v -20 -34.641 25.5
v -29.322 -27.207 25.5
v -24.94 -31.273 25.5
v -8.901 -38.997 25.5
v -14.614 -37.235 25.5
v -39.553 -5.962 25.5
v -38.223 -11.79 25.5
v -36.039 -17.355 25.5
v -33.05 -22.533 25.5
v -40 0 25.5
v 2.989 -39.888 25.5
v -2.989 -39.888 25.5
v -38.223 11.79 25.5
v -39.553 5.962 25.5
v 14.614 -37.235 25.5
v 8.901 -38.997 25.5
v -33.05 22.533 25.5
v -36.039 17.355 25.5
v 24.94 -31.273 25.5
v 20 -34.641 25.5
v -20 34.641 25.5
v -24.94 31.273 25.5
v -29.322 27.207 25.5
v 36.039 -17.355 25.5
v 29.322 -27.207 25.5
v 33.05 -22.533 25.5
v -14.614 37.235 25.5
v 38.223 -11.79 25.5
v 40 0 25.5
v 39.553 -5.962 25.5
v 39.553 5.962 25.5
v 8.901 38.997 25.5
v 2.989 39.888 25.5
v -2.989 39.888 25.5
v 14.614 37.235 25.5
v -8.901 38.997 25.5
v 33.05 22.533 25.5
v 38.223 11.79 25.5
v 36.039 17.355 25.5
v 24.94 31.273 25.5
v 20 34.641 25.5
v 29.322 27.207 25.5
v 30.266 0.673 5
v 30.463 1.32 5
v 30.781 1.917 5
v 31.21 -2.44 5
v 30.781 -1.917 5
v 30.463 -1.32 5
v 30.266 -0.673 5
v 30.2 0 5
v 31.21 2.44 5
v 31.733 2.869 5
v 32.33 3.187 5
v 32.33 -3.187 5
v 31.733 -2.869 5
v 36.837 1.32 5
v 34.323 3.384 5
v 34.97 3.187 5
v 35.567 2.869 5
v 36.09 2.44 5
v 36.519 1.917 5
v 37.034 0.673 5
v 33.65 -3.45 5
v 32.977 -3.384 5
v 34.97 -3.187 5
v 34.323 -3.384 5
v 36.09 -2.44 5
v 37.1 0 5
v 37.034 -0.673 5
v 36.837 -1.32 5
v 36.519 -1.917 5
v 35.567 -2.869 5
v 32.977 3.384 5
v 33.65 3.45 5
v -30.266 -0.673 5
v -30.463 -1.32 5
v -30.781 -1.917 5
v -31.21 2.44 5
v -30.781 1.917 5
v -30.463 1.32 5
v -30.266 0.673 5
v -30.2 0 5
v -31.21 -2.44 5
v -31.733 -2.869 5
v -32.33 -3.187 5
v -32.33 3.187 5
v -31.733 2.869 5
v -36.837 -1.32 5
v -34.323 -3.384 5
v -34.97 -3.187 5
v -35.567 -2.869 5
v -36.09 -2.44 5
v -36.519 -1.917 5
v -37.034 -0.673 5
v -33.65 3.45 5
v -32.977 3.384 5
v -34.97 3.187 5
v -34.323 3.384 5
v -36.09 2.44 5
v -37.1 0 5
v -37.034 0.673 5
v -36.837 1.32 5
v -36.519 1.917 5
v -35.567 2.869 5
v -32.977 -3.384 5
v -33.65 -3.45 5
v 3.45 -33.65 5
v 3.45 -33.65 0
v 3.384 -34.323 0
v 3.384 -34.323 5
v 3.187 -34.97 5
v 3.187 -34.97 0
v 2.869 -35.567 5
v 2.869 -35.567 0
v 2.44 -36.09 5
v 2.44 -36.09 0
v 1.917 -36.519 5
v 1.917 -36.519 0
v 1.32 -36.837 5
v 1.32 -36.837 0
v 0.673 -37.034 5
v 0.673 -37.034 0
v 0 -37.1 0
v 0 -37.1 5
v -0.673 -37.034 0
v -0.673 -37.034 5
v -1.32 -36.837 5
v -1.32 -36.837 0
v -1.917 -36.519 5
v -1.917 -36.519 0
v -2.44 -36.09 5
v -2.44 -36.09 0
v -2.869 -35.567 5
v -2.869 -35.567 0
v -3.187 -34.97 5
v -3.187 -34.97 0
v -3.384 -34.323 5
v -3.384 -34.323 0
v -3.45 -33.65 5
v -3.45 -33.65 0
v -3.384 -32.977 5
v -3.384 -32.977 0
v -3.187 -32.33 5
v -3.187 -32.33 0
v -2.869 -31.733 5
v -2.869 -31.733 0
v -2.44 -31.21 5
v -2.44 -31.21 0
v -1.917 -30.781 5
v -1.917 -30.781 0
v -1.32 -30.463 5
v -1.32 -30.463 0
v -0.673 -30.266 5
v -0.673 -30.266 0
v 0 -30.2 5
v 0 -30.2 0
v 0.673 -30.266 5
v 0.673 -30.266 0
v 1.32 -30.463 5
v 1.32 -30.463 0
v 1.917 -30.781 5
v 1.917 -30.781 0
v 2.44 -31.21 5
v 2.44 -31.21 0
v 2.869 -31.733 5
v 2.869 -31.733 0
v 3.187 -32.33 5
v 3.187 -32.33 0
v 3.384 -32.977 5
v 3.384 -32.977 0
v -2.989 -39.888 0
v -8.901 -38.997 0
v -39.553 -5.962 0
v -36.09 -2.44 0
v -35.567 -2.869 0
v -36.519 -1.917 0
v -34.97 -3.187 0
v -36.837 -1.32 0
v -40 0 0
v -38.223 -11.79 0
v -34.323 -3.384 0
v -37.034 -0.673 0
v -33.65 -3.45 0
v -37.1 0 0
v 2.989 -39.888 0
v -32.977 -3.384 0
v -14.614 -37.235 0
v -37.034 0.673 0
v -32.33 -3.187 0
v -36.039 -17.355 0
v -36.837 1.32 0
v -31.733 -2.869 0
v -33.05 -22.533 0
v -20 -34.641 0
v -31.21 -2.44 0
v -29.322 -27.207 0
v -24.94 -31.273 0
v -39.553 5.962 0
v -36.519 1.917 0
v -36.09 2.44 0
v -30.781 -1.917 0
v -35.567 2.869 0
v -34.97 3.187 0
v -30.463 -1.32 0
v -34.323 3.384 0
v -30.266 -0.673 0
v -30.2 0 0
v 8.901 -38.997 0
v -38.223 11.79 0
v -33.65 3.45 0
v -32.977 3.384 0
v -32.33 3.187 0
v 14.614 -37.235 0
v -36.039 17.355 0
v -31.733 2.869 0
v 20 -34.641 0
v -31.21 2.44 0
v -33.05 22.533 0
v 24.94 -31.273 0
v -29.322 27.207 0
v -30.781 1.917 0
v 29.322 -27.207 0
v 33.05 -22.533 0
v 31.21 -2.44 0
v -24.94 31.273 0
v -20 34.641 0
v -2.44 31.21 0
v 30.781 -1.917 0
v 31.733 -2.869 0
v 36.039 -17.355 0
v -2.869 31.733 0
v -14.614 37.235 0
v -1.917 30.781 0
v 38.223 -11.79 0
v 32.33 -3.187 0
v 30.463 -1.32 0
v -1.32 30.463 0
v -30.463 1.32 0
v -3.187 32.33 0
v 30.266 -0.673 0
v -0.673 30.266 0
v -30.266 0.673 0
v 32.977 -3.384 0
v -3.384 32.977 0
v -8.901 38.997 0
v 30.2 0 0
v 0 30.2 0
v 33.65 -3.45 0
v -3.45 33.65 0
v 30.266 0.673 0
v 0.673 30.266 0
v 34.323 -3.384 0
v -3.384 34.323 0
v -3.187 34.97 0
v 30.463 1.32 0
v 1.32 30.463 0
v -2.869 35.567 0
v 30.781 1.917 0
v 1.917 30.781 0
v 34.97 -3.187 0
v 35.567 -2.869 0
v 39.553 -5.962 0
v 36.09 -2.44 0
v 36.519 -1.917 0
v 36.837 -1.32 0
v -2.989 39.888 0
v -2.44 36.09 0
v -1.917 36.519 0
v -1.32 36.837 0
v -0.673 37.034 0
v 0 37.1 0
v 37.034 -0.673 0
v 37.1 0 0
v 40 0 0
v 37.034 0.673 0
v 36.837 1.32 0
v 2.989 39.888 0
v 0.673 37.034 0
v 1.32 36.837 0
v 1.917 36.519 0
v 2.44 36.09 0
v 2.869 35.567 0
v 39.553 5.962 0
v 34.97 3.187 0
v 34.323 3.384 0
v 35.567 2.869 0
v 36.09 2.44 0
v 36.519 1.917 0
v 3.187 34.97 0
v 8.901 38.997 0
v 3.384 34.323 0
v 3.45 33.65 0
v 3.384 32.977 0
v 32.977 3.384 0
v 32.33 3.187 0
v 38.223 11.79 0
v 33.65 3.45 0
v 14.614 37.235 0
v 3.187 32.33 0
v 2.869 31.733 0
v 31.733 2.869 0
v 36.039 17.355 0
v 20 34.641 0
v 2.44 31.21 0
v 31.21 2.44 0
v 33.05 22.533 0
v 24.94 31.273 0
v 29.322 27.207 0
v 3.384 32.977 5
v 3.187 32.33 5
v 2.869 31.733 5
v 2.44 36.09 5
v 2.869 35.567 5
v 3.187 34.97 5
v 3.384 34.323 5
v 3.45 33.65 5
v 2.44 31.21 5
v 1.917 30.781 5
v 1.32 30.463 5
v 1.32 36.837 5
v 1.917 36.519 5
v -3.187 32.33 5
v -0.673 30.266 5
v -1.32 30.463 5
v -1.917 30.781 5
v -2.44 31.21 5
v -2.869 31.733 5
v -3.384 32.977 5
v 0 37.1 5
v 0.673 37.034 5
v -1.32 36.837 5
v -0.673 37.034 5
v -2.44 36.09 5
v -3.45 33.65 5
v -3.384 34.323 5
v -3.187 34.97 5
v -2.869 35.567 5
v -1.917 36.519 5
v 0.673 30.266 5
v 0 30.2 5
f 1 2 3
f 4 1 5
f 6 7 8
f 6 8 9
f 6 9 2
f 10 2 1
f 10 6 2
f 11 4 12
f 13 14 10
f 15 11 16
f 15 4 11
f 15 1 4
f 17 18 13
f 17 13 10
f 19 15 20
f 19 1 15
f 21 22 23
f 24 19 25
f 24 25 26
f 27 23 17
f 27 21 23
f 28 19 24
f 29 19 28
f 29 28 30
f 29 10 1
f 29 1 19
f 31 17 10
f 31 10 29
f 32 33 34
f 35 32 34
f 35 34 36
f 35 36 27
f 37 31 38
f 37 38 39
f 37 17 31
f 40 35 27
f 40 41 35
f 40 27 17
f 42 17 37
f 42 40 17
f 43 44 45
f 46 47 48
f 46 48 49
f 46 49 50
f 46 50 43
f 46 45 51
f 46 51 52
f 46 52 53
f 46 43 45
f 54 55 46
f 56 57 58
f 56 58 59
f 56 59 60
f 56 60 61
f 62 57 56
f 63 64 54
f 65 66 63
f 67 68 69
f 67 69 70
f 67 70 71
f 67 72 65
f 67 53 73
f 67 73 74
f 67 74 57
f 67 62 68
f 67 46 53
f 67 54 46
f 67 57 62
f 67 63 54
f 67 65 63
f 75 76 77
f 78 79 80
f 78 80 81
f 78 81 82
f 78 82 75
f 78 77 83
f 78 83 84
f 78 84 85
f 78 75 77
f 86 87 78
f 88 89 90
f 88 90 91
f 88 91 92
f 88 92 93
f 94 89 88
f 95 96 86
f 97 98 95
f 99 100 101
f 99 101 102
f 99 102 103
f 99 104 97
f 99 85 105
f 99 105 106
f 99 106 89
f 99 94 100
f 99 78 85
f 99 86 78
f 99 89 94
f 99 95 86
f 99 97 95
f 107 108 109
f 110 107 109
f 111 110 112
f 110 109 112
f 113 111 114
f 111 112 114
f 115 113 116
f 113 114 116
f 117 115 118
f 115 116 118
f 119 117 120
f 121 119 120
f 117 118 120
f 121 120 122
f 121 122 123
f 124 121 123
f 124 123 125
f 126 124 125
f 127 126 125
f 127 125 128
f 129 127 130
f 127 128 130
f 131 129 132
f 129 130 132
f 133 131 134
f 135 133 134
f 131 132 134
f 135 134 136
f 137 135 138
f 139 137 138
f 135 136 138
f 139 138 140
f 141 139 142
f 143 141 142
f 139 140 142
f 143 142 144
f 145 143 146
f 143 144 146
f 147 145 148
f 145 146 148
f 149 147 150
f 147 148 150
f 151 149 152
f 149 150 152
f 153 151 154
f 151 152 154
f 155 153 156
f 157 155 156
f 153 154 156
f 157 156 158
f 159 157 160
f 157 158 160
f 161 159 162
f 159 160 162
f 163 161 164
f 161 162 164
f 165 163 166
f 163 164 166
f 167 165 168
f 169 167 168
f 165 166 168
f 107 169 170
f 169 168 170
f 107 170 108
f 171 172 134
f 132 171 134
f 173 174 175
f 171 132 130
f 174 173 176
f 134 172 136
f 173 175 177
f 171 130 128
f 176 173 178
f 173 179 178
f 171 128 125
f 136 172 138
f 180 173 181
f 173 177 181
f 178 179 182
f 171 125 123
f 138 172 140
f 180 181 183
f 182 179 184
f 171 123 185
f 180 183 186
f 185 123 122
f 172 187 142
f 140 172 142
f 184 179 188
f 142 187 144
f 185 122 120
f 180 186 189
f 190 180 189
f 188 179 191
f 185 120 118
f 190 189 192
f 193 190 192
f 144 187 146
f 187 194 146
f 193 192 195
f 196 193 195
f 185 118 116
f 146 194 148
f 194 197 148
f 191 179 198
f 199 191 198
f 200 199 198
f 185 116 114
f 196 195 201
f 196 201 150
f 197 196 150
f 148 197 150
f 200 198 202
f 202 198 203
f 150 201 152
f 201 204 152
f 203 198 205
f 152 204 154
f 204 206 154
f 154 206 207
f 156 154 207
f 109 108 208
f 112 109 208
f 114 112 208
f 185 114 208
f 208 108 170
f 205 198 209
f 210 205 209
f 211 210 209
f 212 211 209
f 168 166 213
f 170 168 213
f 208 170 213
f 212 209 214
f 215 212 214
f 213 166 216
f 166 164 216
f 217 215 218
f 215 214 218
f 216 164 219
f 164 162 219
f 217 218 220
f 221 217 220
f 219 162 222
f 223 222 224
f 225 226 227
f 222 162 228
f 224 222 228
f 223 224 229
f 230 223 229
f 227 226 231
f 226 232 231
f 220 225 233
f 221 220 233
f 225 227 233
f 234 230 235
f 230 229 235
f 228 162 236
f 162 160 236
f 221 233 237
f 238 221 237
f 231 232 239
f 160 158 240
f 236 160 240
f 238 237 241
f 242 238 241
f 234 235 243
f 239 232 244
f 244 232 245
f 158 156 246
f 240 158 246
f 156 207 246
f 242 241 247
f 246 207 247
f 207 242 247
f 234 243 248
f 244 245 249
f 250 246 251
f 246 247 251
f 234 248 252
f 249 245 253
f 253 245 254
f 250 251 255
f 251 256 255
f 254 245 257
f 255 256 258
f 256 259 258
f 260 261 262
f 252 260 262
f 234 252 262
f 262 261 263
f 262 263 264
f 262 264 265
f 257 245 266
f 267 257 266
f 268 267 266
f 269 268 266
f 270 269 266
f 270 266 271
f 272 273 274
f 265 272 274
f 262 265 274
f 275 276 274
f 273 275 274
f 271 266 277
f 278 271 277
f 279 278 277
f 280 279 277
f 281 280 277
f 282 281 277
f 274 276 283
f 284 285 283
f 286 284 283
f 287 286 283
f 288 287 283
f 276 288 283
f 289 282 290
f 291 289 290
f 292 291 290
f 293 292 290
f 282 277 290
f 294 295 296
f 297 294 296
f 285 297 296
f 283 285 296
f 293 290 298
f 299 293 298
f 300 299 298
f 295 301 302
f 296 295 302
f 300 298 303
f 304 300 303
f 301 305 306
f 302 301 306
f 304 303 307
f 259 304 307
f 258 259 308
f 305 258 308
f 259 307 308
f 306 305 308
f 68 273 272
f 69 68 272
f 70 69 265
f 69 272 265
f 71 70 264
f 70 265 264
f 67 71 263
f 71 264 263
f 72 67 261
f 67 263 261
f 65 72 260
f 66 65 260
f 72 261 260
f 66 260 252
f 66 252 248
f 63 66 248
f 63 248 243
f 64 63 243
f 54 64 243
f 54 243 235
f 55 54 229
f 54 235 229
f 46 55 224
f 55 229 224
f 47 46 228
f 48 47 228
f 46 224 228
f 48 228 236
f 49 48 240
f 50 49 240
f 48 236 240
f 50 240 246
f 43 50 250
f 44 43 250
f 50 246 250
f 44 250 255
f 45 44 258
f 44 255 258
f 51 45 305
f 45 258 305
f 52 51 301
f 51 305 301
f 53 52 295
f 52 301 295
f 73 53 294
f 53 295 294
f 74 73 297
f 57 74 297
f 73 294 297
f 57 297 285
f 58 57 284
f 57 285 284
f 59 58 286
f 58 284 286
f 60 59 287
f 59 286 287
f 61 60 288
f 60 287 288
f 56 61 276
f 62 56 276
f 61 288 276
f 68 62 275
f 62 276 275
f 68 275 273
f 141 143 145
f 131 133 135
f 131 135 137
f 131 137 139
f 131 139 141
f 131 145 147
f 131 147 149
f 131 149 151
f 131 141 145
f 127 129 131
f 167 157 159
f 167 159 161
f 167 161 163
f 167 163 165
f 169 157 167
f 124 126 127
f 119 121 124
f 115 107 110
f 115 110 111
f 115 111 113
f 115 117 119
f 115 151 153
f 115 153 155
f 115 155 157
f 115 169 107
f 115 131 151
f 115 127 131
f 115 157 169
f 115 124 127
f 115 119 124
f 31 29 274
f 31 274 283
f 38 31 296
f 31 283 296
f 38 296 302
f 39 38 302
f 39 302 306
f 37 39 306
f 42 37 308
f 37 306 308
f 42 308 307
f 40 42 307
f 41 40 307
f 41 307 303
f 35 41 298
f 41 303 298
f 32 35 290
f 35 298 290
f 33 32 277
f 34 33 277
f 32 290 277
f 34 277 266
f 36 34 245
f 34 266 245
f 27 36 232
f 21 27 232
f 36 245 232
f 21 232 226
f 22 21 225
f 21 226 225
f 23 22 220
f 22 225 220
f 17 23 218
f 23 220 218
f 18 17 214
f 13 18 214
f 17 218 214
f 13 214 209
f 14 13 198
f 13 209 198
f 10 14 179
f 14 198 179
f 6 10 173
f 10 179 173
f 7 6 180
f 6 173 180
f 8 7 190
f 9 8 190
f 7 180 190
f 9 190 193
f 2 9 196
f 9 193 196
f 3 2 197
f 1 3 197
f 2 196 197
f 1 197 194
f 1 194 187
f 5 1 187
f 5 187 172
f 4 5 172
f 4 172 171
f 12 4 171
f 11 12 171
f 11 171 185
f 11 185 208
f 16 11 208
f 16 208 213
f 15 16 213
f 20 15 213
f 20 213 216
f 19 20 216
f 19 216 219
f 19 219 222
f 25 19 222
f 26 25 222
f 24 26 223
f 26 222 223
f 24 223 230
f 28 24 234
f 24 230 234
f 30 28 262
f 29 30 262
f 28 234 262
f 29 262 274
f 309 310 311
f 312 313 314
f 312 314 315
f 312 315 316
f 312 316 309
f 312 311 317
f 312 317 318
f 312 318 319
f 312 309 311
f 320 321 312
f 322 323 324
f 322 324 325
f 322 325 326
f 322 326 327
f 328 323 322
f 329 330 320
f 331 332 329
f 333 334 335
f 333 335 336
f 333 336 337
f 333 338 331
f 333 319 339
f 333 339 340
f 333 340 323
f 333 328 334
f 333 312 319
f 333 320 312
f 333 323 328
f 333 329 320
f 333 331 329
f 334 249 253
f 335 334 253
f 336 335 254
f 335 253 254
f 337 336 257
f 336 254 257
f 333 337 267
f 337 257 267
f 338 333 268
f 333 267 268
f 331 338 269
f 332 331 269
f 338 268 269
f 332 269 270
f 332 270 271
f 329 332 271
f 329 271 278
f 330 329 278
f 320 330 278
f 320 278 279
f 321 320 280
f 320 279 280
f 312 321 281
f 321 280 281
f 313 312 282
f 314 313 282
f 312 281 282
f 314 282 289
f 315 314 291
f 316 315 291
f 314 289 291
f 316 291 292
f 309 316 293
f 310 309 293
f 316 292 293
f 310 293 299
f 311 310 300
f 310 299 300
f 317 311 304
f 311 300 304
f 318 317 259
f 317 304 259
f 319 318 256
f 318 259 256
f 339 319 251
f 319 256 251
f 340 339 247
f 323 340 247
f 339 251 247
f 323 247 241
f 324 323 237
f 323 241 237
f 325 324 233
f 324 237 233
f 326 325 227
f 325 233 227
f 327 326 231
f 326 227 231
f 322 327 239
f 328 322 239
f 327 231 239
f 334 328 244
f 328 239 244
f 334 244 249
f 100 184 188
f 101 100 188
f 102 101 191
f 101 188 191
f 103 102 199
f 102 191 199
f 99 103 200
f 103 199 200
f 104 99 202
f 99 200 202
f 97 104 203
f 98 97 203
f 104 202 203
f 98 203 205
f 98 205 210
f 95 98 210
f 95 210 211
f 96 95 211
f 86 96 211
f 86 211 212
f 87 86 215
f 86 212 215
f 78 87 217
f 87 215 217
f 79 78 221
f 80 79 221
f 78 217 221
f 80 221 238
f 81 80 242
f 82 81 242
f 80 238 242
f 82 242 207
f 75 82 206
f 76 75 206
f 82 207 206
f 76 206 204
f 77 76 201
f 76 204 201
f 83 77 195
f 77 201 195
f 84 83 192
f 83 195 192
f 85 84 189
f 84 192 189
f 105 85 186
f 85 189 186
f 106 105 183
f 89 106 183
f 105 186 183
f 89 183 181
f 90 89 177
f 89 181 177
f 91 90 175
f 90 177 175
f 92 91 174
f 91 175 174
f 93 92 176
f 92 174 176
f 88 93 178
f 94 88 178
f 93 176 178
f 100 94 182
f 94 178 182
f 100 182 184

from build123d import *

# Parameters (mm, degrees)
SKETCH1_R           = 40
BOSS_EXTRUDE1_DEPTH = 25.5
SKETCH2_R           = 3.45
CUT_EXTRUDE1_DEPTH  = 5


with BuildPart() as part:
    # Sketch1 → Boss-Extrude1 (new body)
    with BuildSketch(Plane.XY):
        Circle(SKETCH1_R)
    extrude(amount=BOSS_EXTRUDE1_DEPTH)

    # Sketch2 → Cut-Extrude1 (cut)
    with BuildSketch(Plane(origin=(0, 0, 0), x_dir=(-1, 0, 0), z_dir=(0, 0, -1))):
        with Locations((0, 33.65)):
            Circle(SKETCH2_R)
        with Locations((33.65, 0)):
            Circle(SKETCH2_R)
        with Locations(Location((0, -33.65, 0), (0, 0, 180))):
            Circle(SKETCH2_R)
        with Locations(Location((-33.65, 0, 0), (0, 0, 180))):
            Circle(SKETCH2_R)
    extrude(amount=-CUT_EXTRUDE1_DEPTH, mode=Mode.SUBTRACT)


solid = part.part
